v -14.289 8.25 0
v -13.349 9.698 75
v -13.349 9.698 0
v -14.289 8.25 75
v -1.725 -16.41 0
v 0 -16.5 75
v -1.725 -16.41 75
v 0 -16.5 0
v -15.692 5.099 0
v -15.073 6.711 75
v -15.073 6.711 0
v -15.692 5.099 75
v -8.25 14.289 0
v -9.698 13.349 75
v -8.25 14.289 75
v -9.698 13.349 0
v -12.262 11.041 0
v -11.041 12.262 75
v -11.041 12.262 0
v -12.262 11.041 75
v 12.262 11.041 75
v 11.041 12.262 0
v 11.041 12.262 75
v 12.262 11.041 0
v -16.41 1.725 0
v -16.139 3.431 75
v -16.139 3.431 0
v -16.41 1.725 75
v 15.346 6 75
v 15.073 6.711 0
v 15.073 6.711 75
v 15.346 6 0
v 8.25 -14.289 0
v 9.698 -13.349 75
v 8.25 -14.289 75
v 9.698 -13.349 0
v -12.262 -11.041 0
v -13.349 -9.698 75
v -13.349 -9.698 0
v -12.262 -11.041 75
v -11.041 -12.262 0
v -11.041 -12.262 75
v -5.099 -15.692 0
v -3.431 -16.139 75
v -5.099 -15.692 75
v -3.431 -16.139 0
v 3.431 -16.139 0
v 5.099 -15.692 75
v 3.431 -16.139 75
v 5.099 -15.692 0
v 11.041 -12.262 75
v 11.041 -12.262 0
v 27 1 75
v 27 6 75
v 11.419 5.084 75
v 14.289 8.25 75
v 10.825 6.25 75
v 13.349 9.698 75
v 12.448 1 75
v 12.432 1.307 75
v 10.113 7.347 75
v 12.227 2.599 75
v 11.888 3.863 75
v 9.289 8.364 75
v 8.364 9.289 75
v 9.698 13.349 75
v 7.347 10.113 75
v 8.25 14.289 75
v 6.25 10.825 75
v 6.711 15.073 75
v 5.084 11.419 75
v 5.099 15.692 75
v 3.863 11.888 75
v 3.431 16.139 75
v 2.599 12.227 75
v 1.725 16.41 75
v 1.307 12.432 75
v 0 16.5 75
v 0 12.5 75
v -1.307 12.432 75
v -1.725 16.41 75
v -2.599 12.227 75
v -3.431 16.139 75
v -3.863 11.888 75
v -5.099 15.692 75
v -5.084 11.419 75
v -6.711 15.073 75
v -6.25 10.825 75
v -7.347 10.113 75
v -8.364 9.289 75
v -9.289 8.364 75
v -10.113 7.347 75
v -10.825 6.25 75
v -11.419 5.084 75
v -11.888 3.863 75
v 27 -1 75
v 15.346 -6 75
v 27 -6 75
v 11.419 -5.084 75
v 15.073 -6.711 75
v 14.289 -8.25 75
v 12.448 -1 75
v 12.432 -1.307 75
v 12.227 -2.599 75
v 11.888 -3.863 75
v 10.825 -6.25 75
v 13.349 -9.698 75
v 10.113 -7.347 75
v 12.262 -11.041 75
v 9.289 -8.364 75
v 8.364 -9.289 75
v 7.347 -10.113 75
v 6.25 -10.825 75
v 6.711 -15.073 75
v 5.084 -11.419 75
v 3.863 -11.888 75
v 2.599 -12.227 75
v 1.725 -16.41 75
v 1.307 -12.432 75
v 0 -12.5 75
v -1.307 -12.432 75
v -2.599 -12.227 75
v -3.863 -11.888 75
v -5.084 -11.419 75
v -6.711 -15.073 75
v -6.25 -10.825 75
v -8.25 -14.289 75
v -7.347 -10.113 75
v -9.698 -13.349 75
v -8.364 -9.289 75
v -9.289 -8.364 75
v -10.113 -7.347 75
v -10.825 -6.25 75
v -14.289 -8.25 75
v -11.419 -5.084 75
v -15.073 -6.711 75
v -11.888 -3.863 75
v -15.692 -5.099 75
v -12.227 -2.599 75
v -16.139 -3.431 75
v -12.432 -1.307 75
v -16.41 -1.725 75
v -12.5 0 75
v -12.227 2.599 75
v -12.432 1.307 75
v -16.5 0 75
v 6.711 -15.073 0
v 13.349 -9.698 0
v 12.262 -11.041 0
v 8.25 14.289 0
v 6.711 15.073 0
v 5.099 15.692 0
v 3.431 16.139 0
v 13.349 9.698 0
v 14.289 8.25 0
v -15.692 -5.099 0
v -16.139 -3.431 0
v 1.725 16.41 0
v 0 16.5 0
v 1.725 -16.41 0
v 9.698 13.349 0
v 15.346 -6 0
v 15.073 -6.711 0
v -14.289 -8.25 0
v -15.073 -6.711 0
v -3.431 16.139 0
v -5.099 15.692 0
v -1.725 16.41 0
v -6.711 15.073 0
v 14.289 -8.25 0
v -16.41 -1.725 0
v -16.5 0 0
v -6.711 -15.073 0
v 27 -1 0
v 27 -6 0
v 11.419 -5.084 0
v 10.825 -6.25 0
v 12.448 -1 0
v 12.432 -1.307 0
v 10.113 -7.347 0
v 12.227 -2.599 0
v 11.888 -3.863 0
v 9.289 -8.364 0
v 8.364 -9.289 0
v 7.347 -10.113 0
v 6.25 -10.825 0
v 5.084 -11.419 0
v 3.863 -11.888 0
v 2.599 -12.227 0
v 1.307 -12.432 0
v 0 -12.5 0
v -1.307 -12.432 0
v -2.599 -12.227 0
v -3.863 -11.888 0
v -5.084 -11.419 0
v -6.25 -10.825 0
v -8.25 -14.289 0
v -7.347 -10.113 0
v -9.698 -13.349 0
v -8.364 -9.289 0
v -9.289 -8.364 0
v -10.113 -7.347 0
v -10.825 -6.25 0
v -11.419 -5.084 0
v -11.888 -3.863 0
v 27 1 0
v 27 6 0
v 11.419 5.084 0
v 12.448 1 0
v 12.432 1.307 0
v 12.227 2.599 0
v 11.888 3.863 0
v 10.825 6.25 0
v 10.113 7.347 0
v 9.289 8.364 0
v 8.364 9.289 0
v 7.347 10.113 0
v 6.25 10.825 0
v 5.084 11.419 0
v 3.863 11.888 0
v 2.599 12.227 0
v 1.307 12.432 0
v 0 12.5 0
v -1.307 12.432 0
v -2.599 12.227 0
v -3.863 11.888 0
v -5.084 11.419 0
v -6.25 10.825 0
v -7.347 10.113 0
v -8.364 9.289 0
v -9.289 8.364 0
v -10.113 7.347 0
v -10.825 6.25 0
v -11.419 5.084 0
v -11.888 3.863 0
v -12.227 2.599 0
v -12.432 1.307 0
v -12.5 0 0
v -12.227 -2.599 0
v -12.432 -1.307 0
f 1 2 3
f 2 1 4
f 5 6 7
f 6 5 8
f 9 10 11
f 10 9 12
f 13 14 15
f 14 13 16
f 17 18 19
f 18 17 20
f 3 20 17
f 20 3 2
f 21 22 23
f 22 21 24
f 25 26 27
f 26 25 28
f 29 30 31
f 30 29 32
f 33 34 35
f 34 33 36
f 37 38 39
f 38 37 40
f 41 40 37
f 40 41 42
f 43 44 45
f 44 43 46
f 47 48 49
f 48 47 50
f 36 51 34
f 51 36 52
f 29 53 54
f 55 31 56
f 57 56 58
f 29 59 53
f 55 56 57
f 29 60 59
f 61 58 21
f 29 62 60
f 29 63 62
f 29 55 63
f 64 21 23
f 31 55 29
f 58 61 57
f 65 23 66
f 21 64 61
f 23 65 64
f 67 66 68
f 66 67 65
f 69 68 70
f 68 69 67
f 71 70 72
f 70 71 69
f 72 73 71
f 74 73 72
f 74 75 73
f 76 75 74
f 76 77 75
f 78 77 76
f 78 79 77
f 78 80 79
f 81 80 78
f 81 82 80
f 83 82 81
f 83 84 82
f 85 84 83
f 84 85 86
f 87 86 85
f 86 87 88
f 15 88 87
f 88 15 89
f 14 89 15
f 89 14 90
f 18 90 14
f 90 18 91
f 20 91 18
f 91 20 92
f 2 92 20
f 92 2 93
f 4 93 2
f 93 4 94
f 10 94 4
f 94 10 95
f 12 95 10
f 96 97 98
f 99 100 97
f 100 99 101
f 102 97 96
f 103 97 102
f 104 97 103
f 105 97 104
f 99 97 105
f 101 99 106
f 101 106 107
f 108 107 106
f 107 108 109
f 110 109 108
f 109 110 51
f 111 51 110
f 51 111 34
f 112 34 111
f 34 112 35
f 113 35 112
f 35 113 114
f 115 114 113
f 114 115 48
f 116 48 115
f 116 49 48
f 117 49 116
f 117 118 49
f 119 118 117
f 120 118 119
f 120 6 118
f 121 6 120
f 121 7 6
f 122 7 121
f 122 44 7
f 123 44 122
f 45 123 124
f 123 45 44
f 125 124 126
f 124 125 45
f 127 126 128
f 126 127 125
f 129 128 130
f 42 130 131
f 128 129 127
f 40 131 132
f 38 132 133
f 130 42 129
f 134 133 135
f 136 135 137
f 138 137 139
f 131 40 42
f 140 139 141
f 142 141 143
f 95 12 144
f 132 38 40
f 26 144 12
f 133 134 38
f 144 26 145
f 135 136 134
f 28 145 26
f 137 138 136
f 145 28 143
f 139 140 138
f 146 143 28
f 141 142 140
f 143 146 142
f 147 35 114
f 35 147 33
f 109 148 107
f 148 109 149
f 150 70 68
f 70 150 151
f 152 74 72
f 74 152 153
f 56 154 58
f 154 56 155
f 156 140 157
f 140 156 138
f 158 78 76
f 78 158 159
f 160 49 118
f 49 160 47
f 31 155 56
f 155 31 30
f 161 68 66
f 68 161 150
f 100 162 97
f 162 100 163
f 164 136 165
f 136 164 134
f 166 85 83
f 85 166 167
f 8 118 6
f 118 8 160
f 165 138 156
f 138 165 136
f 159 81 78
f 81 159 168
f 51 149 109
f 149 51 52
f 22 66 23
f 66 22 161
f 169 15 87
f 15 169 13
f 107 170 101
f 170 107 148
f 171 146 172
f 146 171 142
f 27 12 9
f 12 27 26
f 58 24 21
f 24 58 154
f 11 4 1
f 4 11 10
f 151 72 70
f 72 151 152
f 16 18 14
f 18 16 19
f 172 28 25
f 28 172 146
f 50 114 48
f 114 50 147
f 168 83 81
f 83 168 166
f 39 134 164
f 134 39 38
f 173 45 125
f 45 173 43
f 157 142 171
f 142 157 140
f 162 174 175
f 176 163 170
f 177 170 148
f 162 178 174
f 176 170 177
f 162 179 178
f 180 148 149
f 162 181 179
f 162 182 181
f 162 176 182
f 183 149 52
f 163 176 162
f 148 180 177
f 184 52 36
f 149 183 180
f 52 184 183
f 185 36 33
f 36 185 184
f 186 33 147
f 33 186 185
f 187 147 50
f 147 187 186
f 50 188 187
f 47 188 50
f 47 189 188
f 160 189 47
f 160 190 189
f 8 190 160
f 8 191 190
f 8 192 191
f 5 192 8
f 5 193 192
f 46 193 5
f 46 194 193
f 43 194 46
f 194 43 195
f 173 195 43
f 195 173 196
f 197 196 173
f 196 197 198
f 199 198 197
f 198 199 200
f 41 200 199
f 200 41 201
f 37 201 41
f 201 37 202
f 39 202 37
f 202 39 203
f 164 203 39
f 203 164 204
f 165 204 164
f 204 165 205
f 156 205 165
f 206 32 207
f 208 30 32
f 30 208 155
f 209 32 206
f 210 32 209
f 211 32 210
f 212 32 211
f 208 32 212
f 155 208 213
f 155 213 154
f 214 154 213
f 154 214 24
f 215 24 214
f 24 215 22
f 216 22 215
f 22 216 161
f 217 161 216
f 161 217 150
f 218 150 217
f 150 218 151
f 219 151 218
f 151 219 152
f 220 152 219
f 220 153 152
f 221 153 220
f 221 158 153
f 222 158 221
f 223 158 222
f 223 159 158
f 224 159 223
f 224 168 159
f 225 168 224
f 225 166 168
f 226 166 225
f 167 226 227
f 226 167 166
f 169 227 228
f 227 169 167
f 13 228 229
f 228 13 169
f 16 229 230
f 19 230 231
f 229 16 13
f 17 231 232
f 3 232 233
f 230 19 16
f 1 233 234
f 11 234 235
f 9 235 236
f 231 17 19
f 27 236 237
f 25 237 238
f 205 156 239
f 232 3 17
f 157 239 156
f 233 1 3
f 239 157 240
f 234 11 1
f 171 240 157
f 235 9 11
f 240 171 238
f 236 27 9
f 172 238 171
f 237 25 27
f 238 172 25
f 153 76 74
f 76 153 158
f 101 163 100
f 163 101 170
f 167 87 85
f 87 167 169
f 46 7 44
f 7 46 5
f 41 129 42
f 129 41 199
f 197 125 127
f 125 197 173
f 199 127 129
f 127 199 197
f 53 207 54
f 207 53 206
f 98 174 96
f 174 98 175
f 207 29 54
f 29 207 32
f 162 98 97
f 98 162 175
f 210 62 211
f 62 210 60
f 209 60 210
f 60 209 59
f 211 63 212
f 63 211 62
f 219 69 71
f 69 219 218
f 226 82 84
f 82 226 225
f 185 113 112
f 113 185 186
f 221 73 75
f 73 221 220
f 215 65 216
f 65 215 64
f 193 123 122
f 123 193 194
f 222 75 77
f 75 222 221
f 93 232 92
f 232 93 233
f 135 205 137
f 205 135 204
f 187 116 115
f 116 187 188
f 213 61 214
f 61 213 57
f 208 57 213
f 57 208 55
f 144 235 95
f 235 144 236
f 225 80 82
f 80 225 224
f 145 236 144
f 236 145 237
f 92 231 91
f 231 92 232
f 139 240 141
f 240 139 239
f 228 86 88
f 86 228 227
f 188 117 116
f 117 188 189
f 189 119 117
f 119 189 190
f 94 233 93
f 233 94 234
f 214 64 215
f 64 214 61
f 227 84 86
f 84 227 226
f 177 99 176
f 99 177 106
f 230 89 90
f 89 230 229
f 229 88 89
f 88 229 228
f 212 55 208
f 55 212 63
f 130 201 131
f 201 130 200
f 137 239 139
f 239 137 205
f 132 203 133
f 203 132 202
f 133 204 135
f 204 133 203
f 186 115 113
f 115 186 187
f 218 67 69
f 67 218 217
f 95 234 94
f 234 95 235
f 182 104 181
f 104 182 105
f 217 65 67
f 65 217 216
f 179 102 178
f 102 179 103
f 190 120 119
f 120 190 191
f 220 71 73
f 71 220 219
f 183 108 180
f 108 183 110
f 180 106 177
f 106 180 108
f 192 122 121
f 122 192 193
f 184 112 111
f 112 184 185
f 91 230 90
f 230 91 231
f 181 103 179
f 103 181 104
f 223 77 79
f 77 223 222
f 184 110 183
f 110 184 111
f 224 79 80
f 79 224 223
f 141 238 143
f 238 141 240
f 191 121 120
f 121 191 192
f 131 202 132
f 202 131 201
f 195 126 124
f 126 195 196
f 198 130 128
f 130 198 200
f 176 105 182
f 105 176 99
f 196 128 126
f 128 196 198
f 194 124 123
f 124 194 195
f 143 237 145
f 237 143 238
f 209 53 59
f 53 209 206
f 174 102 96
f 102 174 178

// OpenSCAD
$fn = 60;

    difference() {
        union() {
            cylinder(d=25+8, h=75);
            translate([(25+8+6)/2,0,75/2])
                cube([15,12,75],center=true);
         }
        cylinder(d=25, h=75);
        translate([(25+8)/2,0,75/2]) 
            cube([24,2,75],center=true);
    }
